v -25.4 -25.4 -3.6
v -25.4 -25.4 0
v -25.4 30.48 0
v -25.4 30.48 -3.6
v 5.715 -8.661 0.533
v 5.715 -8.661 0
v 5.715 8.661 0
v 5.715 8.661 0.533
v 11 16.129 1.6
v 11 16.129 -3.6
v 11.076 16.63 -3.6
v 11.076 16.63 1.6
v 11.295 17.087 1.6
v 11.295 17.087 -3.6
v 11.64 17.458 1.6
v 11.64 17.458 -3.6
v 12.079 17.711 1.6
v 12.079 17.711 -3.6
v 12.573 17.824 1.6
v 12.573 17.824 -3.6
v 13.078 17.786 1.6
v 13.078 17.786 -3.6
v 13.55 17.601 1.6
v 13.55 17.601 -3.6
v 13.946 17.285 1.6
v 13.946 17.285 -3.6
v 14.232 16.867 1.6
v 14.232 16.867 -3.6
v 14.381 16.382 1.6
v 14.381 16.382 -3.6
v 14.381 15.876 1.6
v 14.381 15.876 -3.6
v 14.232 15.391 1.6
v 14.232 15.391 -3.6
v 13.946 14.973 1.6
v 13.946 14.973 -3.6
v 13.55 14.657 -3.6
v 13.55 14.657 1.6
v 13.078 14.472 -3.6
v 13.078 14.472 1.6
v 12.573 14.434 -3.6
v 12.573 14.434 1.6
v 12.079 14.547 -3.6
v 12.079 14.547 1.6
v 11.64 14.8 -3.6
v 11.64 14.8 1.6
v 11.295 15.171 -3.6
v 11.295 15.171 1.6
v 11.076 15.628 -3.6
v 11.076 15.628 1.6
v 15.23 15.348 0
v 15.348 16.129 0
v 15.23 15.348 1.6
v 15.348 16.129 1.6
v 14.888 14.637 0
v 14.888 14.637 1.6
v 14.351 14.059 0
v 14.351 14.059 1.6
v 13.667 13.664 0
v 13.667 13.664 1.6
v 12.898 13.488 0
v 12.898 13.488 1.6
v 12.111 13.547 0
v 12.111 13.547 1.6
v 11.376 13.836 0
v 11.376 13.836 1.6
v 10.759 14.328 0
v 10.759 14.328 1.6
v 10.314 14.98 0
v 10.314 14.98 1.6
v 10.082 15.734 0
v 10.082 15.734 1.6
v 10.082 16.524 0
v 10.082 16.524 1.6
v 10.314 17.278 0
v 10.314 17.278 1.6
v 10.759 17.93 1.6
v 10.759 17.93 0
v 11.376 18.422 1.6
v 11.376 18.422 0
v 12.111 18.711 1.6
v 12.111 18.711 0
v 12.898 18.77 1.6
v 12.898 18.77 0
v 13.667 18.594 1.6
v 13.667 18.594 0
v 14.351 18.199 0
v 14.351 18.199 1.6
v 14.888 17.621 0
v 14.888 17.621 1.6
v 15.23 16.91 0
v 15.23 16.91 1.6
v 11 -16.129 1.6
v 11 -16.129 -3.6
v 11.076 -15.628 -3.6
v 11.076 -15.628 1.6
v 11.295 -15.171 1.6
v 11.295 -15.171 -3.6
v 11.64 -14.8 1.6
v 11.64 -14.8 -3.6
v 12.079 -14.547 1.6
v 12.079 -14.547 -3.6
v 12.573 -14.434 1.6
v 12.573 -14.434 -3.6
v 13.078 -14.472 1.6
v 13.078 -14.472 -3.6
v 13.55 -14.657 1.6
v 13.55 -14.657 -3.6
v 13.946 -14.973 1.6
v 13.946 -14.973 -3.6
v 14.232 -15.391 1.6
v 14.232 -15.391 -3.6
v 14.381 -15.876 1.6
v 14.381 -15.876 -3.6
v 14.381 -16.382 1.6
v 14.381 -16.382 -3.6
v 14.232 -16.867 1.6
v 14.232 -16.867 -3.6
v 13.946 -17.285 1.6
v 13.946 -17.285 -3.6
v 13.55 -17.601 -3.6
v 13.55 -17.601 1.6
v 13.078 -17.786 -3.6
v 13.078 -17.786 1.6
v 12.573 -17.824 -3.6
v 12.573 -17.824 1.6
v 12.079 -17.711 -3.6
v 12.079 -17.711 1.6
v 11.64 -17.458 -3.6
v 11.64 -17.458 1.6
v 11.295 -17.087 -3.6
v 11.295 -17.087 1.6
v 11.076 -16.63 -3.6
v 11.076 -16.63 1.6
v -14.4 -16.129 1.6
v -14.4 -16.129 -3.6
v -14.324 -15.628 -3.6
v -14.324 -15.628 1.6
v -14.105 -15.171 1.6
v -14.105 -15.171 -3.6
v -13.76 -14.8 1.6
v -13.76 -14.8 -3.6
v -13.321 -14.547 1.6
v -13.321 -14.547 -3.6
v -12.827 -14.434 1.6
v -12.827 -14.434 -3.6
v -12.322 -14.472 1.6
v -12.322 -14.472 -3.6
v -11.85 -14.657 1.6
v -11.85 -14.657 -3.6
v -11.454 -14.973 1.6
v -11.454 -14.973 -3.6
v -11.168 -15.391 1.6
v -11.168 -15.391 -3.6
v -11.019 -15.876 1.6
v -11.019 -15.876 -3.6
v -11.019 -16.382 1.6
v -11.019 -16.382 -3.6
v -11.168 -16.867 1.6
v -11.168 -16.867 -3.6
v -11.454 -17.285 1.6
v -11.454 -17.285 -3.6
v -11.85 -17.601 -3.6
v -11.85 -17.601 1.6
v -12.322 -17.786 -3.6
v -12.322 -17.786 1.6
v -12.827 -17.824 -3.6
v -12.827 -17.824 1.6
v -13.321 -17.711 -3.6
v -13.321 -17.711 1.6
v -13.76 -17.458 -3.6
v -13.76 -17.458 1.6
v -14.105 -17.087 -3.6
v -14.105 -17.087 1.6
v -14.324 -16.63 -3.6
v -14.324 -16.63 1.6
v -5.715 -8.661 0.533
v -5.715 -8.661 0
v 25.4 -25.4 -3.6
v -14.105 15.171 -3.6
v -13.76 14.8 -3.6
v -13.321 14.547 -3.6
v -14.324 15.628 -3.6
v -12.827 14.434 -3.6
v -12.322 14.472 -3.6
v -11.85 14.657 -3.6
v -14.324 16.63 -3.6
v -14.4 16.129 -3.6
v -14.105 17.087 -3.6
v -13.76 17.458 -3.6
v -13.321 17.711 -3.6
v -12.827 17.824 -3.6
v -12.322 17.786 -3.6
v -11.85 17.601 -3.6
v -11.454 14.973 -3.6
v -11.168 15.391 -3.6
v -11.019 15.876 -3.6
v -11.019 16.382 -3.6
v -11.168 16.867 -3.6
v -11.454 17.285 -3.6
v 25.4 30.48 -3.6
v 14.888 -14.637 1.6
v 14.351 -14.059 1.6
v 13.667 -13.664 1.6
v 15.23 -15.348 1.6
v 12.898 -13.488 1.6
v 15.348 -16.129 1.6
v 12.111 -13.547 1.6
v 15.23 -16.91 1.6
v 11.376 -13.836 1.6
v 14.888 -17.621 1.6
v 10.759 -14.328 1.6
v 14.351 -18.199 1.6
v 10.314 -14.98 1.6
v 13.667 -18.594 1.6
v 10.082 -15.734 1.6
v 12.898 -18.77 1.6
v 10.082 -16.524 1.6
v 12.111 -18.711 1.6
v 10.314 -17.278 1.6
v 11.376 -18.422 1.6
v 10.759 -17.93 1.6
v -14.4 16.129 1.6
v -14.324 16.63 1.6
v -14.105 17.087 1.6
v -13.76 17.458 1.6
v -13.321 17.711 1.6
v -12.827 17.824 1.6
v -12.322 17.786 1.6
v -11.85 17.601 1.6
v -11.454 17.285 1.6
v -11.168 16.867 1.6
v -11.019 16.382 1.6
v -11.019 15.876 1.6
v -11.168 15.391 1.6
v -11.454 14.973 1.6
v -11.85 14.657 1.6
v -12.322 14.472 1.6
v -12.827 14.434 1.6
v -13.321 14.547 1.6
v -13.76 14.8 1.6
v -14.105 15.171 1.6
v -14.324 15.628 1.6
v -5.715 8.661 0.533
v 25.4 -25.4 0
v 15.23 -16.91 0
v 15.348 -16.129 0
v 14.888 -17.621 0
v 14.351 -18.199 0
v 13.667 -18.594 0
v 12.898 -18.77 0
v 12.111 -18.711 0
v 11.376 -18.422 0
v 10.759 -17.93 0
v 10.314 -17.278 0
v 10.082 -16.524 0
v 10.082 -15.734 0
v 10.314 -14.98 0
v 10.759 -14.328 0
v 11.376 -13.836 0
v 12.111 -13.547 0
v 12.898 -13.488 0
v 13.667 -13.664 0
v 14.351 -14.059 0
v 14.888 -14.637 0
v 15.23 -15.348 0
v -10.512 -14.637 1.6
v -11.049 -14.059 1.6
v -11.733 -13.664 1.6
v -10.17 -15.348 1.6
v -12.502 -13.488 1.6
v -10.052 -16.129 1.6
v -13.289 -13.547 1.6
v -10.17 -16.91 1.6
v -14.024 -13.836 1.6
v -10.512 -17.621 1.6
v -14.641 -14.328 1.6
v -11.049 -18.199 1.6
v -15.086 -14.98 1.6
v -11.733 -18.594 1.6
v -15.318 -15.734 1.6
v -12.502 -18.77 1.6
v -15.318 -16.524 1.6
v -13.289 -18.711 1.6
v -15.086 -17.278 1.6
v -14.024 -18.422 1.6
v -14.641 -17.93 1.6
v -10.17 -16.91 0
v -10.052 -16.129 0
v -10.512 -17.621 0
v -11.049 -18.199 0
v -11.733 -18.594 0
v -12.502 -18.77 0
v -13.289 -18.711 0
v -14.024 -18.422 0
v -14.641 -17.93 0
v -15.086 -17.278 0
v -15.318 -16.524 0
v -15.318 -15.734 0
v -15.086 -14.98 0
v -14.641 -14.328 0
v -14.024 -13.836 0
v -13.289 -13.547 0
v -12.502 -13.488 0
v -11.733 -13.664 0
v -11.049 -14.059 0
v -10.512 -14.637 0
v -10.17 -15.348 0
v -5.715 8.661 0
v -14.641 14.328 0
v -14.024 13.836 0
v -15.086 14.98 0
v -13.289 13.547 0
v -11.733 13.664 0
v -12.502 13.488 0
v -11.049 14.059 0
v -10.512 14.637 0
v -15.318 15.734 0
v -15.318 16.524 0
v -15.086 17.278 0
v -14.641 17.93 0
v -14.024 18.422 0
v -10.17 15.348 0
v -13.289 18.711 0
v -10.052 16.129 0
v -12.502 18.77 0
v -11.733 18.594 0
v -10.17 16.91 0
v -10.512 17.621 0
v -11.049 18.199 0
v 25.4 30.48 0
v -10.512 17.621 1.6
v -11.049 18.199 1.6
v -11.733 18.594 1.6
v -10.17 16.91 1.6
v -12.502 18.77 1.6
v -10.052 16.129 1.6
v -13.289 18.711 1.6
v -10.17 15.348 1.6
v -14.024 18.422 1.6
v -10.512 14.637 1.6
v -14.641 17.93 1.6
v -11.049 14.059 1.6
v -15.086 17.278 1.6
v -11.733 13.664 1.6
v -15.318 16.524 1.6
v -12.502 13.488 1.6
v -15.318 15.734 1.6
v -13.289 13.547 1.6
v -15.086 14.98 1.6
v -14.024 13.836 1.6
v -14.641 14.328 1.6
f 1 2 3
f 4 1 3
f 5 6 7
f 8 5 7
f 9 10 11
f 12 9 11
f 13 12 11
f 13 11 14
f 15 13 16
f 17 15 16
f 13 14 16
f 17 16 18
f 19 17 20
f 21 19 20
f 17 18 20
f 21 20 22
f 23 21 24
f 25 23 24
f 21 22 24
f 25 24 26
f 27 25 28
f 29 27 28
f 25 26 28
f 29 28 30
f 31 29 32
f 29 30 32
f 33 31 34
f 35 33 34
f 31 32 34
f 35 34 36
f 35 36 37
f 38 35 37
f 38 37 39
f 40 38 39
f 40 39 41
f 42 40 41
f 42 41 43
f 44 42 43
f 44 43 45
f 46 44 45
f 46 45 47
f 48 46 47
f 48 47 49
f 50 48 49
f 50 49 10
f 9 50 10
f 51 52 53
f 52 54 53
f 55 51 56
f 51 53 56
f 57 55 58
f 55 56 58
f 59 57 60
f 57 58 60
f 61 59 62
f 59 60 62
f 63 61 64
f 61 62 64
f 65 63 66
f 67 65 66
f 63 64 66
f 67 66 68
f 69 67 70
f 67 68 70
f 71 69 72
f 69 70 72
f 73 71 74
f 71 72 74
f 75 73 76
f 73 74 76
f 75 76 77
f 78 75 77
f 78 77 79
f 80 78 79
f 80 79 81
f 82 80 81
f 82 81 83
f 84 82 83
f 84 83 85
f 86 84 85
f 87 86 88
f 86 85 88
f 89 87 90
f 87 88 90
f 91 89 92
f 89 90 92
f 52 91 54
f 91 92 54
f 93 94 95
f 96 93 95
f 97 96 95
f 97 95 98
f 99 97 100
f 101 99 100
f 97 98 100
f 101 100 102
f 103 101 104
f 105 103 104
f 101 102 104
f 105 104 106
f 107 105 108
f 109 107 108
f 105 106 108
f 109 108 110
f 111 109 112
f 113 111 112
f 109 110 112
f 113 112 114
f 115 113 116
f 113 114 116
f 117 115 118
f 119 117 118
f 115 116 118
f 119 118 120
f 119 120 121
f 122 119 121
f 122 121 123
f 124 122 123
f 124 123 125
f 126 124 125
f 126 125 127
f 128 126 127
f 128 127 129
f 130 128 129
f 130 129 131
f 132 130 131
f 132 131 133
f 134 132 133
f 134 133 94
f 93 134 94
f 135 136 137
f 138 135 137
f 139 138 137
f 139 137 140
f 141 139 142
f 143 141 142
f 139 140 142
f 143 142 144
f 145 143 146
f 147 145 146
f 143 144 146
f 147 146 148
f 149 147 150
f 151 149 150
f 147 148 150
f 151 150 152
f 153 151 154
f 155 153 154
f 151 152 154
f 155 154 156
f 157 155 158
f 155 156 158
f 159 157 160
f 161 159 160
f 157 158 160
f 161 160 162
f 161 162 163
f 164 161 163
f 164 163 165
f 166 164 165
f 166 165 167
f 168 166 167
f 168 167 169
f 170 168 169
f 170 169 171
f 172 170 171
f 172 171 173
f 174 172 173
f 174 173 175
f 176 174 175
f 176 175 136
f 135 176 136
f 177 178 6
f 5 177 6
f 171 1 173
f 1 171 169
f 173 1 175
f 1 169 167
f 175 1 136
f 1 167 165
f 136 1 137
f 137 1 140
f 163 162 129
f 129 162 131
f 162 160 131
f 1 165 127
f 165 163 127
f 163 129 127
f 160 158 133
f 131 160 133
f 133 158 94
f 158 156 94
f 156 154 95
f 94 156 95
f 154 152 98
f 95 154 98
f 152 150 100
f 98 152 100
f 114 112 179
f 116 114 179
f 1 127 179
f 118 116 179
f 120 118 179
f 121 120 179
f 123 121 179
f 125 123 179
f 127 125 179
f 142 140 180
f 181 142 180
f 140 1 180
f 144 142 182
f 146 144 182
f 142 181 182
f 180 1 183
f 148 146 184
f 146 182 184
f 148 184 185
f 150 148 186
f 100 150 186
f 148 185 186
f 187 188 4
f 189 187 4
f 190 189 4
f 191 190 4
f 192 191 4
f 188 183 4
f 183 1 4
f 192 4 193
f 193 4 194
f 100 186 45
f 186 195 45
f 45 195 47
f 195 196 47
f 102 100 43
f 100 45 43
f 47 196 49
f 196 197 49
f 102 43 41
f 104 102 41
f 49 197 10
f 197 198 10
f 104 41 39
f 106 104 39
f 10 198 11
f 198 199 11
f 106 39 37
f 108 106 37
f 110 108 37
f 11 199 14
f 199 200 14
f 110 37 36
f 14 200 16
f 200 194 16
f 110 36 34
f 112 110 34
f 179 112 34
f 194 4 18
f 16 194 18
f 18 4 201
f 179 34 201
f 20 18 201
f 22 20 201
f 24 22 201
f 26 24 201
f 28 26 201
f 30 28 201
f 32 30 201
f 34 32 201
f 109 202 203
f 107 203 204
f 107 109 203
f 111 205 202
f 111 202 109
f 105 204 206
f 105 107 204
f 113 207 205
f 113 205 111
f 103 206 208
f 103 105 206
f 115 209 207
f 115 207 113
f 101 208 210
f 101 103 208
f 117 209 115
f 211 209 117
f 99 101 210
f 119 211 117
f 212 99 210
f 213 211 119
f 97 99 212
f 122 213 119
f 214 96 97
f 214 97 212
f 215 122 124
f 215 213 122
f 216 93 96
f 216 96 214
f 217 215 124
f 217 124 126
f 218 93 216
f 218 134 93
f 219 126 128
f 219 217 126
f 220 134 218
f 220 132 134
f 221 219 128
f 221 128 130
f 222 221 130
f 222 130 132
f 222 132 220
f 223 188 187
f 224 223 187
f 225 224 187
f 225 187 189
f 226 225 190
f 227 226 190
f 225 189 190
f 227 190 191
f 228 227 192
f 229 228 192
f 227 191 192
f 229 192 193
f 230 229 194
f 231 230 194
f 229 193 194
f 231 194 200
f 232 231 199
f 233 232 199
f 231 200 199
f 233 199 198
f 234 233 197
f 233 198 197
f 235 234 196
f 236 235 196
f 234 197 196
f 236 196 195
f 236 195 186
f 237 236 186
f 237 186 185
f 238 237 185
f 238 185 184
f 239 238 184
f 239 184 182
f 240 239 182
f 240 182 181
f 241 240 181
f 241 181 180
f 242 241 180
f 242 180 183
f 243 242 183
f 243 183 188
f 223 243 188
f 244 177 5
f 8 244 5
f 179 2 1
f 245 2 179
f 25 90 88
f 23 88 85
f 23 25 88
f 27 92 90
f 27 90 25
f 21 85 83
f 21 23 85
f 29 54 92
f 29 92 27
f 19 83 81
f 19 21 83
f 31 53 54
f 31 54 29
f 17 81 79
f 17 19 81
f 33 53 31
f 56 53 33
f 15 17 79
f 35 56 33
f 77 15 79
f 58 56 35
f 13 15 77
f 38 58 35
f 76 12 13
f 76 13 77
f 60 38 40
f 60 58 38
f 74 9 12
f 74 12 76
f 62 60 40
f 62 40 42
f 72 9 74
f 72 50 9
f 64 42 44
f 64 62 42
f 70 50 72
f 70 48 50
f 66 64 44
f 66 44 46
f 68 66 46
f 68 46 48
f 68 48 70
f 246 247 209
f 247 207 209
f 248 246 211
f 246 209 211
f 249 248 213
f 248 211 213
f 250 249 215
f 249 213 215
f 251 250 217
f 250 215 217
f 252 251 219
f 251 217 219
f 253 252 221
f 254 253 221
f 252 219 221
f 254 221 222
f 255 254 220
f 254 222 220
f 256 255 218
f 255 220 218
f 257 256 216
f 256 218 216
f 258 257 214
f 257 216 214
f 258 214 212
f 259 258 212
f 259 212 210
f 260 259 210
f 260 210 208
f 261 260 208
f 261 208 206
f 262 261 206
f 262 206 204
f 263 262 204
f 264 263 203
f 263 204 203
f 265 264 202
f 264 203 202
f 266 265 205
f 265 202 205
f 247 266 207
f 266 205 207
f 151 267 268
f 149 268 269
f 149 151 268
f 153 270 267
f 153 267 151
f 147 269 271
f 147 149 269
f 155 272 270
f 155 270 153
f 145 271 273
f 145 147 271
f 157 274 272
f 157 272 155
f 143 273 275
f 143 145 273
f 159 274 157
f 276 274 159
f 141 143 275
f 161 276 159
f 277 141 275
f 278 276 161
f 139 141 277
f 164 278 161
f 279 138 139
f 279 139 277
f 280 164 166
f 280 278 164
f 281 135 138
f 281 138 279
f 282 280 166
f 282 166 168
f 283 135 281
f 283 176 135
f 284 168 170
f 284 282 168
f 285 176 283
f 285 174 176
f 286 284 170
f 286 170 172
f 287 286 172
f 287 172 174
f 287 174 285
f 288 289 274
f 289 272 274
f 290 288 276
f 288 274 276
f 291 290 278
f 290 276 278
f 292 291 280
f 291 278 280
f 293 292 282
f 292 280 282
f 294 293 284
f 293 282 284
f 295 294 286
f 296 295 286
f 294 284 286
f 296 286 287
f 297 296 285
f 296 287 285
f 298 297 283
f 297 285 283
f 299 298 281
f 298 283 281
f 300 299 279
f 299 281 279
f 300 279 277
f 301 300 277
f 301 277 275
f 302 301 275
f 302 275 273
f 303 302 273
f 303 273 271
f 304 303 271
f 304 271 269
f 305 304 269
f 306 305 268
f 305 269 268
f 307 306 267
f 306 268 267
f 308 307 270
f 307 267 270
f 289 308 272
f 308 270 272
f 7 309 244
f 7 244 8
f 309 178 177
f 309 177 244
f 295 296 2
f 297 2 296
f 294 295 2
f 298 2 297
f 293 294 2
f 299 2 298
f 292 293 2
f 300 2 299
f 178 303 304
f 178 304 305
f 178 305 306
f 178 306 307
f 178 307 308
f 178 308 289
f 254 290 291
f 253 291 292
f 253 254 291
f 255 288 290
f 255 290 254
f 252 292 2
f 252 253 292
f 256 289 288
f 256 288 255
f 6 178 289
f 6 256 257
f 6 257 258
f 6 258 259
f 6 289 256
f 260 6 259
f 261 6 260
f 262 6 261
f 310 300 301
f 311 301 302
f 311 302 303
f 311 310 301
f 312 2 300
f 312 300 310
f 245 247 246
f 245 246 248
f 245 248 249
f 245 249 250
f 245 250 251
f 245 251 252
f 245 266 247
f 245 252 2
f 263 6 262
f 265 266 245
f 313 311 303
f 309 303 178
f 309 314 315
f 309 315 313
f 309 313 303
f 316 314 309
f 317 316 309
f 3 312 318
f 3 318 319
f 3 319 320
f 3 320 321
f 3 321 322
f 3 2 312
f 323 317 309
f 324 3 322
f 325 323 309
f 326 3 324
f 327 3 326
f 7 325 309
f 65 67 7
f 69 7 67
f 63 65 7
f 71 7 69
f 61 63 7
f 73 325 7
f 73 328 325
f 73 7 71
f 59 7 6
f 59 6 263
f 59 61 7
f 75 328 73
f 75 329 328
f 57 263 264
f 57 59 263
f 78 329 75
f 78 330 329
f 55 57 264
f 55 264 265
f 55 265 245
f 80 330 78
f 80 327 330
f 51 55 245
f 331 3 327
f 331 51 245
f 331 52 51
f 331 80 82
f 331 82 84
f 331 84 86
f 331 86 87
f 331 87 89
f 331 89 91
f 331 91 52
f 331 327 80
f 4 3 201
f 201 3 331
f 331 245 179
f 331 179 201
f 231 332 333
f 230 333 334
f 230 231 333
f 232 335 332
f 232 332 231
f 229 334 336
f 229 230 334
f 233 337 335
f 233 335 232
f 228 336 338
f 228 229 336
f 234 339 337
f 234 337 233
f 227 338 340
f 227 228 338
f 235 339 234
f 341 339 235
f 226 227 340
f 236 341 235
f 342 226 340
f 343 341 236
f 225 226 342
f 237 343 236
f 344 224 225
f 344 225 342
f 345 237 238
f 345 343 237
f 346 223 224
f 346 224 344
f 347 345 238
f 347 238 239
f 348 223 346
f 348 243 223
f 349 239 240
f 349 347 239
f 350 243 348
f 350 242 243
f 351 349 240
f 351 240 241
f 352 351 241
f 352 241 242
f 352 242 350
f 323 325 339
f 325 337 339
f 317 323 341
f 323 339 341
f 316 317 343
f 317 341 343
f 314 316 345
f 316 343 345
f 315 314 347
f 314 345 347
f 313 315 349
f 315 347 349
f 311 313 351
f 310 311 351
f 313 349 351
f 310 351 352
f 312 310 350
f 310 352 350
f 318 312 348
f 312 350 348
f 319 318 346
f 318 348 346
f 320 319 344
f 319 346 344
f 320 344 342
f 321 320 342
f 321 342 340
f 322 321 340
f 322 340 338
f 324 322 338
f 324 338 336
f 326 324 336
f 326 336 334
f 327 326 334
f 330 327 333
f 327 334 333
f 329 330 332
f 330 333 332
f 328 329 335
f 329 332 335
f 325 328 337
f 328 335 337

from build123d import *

# Parameters (mm, degrees)
SKETCH1_W                  = 50.8
SKETCH1_H                  = 55.88
BOSS_EXTRUDE1_DEPTH        = 3.6
SKETCH2_W                  = 11.43
SKETCH2_H                  = 17.3228
BOSS_EXTRUDE2_DEPTH        = 0.5332
SKETCH3_W                  = 2.648
SKETCH3_H                  = 1.6
SKETCH4_W                  = 2.648
SKETCH4_H                  = 1.6
SKETCH5_W                  = 2.648
SKETCH5_H                  = 1.6
SKETCH6_W                  = 2.648
SKETCH6_H                  = 1.6
F_3_4_3_4_DIAMETER_HOLE1_D = 3.4


with BuildPart() as part:
    # Sketch1 → Boss-Extrude1 (new body)
    with BuildSketch(Plane.XY):
        with Locations((0, 2.54)):
            Rectangle(SKETCH1_W, SKETCH1_H)
    extrude(amount=-BOSS_EXTRUDE1_DEPTH)

    # Sketch2 → Boss-Extrude2 (add)
    with BuildSketch(Plane.XY):
        Rectangle(SKETCH2_W, SKETCH2_H)
    extrude(amount=BOSS_EXTRUDE2_DEPTH)

    # Sketch3 → Revolve1 (revolve)
    with BuildSketch(Plane.XZ.offset(-16.129)):
        with Locations((-11.376, 0.8)):
            Rectangle(SKETCH3_W, SKETCH3_H)
    revolve(axis=Axis((-12.7, 16.129, 1.6), (0, 0, -1)))

    # Sketch4 → Revolve2 (revolve)
    with BuildSketch(Plane.XZ.offset(16.129)):
        with Locations((-11.376, 0.8)):
            Rectangle(SKETCH4_W, SKETCH4_H)
    revolve(axis=Axis((-12.7, -16.129, 1.6), (0, 0, -1)))

    # Sketch5 → Revolve3 (revolve)
    with BuildSketch(Plane.XZ.offset(16.129)):
        with Locations((14.024, 0.8)):
            Rectangle(SKETCH5_W, SKETCH5_H)
    revolve(axis=Axis((12.7, -16.129, 1.6), (0, 0, -1)))

    # Sketch6 → Revolve4 (revolve)
    with BuildSketch(Plane.XZ.offset(-16.129)):
        with Locations((14.024, 0.8)):
            Rectangle(SKETCH6_W, SKETCH6_H)
    revolve(axis=Axis((12.7, 16.129, 1.6), (0, 0, -1)))

    # Ø3.4 (3.4) Diameter Hole1 (through all)
    with Locations(Plane.XY.offset(1.6)):
        with Locations((-12.7, -16.129), (12.7, -16.129), (12.7, 16.129), (-12.7, 16.129)):
            Hole(F_3_4_3_4_DIAMETER_HOLE1_D / 2)


solid = part.part
